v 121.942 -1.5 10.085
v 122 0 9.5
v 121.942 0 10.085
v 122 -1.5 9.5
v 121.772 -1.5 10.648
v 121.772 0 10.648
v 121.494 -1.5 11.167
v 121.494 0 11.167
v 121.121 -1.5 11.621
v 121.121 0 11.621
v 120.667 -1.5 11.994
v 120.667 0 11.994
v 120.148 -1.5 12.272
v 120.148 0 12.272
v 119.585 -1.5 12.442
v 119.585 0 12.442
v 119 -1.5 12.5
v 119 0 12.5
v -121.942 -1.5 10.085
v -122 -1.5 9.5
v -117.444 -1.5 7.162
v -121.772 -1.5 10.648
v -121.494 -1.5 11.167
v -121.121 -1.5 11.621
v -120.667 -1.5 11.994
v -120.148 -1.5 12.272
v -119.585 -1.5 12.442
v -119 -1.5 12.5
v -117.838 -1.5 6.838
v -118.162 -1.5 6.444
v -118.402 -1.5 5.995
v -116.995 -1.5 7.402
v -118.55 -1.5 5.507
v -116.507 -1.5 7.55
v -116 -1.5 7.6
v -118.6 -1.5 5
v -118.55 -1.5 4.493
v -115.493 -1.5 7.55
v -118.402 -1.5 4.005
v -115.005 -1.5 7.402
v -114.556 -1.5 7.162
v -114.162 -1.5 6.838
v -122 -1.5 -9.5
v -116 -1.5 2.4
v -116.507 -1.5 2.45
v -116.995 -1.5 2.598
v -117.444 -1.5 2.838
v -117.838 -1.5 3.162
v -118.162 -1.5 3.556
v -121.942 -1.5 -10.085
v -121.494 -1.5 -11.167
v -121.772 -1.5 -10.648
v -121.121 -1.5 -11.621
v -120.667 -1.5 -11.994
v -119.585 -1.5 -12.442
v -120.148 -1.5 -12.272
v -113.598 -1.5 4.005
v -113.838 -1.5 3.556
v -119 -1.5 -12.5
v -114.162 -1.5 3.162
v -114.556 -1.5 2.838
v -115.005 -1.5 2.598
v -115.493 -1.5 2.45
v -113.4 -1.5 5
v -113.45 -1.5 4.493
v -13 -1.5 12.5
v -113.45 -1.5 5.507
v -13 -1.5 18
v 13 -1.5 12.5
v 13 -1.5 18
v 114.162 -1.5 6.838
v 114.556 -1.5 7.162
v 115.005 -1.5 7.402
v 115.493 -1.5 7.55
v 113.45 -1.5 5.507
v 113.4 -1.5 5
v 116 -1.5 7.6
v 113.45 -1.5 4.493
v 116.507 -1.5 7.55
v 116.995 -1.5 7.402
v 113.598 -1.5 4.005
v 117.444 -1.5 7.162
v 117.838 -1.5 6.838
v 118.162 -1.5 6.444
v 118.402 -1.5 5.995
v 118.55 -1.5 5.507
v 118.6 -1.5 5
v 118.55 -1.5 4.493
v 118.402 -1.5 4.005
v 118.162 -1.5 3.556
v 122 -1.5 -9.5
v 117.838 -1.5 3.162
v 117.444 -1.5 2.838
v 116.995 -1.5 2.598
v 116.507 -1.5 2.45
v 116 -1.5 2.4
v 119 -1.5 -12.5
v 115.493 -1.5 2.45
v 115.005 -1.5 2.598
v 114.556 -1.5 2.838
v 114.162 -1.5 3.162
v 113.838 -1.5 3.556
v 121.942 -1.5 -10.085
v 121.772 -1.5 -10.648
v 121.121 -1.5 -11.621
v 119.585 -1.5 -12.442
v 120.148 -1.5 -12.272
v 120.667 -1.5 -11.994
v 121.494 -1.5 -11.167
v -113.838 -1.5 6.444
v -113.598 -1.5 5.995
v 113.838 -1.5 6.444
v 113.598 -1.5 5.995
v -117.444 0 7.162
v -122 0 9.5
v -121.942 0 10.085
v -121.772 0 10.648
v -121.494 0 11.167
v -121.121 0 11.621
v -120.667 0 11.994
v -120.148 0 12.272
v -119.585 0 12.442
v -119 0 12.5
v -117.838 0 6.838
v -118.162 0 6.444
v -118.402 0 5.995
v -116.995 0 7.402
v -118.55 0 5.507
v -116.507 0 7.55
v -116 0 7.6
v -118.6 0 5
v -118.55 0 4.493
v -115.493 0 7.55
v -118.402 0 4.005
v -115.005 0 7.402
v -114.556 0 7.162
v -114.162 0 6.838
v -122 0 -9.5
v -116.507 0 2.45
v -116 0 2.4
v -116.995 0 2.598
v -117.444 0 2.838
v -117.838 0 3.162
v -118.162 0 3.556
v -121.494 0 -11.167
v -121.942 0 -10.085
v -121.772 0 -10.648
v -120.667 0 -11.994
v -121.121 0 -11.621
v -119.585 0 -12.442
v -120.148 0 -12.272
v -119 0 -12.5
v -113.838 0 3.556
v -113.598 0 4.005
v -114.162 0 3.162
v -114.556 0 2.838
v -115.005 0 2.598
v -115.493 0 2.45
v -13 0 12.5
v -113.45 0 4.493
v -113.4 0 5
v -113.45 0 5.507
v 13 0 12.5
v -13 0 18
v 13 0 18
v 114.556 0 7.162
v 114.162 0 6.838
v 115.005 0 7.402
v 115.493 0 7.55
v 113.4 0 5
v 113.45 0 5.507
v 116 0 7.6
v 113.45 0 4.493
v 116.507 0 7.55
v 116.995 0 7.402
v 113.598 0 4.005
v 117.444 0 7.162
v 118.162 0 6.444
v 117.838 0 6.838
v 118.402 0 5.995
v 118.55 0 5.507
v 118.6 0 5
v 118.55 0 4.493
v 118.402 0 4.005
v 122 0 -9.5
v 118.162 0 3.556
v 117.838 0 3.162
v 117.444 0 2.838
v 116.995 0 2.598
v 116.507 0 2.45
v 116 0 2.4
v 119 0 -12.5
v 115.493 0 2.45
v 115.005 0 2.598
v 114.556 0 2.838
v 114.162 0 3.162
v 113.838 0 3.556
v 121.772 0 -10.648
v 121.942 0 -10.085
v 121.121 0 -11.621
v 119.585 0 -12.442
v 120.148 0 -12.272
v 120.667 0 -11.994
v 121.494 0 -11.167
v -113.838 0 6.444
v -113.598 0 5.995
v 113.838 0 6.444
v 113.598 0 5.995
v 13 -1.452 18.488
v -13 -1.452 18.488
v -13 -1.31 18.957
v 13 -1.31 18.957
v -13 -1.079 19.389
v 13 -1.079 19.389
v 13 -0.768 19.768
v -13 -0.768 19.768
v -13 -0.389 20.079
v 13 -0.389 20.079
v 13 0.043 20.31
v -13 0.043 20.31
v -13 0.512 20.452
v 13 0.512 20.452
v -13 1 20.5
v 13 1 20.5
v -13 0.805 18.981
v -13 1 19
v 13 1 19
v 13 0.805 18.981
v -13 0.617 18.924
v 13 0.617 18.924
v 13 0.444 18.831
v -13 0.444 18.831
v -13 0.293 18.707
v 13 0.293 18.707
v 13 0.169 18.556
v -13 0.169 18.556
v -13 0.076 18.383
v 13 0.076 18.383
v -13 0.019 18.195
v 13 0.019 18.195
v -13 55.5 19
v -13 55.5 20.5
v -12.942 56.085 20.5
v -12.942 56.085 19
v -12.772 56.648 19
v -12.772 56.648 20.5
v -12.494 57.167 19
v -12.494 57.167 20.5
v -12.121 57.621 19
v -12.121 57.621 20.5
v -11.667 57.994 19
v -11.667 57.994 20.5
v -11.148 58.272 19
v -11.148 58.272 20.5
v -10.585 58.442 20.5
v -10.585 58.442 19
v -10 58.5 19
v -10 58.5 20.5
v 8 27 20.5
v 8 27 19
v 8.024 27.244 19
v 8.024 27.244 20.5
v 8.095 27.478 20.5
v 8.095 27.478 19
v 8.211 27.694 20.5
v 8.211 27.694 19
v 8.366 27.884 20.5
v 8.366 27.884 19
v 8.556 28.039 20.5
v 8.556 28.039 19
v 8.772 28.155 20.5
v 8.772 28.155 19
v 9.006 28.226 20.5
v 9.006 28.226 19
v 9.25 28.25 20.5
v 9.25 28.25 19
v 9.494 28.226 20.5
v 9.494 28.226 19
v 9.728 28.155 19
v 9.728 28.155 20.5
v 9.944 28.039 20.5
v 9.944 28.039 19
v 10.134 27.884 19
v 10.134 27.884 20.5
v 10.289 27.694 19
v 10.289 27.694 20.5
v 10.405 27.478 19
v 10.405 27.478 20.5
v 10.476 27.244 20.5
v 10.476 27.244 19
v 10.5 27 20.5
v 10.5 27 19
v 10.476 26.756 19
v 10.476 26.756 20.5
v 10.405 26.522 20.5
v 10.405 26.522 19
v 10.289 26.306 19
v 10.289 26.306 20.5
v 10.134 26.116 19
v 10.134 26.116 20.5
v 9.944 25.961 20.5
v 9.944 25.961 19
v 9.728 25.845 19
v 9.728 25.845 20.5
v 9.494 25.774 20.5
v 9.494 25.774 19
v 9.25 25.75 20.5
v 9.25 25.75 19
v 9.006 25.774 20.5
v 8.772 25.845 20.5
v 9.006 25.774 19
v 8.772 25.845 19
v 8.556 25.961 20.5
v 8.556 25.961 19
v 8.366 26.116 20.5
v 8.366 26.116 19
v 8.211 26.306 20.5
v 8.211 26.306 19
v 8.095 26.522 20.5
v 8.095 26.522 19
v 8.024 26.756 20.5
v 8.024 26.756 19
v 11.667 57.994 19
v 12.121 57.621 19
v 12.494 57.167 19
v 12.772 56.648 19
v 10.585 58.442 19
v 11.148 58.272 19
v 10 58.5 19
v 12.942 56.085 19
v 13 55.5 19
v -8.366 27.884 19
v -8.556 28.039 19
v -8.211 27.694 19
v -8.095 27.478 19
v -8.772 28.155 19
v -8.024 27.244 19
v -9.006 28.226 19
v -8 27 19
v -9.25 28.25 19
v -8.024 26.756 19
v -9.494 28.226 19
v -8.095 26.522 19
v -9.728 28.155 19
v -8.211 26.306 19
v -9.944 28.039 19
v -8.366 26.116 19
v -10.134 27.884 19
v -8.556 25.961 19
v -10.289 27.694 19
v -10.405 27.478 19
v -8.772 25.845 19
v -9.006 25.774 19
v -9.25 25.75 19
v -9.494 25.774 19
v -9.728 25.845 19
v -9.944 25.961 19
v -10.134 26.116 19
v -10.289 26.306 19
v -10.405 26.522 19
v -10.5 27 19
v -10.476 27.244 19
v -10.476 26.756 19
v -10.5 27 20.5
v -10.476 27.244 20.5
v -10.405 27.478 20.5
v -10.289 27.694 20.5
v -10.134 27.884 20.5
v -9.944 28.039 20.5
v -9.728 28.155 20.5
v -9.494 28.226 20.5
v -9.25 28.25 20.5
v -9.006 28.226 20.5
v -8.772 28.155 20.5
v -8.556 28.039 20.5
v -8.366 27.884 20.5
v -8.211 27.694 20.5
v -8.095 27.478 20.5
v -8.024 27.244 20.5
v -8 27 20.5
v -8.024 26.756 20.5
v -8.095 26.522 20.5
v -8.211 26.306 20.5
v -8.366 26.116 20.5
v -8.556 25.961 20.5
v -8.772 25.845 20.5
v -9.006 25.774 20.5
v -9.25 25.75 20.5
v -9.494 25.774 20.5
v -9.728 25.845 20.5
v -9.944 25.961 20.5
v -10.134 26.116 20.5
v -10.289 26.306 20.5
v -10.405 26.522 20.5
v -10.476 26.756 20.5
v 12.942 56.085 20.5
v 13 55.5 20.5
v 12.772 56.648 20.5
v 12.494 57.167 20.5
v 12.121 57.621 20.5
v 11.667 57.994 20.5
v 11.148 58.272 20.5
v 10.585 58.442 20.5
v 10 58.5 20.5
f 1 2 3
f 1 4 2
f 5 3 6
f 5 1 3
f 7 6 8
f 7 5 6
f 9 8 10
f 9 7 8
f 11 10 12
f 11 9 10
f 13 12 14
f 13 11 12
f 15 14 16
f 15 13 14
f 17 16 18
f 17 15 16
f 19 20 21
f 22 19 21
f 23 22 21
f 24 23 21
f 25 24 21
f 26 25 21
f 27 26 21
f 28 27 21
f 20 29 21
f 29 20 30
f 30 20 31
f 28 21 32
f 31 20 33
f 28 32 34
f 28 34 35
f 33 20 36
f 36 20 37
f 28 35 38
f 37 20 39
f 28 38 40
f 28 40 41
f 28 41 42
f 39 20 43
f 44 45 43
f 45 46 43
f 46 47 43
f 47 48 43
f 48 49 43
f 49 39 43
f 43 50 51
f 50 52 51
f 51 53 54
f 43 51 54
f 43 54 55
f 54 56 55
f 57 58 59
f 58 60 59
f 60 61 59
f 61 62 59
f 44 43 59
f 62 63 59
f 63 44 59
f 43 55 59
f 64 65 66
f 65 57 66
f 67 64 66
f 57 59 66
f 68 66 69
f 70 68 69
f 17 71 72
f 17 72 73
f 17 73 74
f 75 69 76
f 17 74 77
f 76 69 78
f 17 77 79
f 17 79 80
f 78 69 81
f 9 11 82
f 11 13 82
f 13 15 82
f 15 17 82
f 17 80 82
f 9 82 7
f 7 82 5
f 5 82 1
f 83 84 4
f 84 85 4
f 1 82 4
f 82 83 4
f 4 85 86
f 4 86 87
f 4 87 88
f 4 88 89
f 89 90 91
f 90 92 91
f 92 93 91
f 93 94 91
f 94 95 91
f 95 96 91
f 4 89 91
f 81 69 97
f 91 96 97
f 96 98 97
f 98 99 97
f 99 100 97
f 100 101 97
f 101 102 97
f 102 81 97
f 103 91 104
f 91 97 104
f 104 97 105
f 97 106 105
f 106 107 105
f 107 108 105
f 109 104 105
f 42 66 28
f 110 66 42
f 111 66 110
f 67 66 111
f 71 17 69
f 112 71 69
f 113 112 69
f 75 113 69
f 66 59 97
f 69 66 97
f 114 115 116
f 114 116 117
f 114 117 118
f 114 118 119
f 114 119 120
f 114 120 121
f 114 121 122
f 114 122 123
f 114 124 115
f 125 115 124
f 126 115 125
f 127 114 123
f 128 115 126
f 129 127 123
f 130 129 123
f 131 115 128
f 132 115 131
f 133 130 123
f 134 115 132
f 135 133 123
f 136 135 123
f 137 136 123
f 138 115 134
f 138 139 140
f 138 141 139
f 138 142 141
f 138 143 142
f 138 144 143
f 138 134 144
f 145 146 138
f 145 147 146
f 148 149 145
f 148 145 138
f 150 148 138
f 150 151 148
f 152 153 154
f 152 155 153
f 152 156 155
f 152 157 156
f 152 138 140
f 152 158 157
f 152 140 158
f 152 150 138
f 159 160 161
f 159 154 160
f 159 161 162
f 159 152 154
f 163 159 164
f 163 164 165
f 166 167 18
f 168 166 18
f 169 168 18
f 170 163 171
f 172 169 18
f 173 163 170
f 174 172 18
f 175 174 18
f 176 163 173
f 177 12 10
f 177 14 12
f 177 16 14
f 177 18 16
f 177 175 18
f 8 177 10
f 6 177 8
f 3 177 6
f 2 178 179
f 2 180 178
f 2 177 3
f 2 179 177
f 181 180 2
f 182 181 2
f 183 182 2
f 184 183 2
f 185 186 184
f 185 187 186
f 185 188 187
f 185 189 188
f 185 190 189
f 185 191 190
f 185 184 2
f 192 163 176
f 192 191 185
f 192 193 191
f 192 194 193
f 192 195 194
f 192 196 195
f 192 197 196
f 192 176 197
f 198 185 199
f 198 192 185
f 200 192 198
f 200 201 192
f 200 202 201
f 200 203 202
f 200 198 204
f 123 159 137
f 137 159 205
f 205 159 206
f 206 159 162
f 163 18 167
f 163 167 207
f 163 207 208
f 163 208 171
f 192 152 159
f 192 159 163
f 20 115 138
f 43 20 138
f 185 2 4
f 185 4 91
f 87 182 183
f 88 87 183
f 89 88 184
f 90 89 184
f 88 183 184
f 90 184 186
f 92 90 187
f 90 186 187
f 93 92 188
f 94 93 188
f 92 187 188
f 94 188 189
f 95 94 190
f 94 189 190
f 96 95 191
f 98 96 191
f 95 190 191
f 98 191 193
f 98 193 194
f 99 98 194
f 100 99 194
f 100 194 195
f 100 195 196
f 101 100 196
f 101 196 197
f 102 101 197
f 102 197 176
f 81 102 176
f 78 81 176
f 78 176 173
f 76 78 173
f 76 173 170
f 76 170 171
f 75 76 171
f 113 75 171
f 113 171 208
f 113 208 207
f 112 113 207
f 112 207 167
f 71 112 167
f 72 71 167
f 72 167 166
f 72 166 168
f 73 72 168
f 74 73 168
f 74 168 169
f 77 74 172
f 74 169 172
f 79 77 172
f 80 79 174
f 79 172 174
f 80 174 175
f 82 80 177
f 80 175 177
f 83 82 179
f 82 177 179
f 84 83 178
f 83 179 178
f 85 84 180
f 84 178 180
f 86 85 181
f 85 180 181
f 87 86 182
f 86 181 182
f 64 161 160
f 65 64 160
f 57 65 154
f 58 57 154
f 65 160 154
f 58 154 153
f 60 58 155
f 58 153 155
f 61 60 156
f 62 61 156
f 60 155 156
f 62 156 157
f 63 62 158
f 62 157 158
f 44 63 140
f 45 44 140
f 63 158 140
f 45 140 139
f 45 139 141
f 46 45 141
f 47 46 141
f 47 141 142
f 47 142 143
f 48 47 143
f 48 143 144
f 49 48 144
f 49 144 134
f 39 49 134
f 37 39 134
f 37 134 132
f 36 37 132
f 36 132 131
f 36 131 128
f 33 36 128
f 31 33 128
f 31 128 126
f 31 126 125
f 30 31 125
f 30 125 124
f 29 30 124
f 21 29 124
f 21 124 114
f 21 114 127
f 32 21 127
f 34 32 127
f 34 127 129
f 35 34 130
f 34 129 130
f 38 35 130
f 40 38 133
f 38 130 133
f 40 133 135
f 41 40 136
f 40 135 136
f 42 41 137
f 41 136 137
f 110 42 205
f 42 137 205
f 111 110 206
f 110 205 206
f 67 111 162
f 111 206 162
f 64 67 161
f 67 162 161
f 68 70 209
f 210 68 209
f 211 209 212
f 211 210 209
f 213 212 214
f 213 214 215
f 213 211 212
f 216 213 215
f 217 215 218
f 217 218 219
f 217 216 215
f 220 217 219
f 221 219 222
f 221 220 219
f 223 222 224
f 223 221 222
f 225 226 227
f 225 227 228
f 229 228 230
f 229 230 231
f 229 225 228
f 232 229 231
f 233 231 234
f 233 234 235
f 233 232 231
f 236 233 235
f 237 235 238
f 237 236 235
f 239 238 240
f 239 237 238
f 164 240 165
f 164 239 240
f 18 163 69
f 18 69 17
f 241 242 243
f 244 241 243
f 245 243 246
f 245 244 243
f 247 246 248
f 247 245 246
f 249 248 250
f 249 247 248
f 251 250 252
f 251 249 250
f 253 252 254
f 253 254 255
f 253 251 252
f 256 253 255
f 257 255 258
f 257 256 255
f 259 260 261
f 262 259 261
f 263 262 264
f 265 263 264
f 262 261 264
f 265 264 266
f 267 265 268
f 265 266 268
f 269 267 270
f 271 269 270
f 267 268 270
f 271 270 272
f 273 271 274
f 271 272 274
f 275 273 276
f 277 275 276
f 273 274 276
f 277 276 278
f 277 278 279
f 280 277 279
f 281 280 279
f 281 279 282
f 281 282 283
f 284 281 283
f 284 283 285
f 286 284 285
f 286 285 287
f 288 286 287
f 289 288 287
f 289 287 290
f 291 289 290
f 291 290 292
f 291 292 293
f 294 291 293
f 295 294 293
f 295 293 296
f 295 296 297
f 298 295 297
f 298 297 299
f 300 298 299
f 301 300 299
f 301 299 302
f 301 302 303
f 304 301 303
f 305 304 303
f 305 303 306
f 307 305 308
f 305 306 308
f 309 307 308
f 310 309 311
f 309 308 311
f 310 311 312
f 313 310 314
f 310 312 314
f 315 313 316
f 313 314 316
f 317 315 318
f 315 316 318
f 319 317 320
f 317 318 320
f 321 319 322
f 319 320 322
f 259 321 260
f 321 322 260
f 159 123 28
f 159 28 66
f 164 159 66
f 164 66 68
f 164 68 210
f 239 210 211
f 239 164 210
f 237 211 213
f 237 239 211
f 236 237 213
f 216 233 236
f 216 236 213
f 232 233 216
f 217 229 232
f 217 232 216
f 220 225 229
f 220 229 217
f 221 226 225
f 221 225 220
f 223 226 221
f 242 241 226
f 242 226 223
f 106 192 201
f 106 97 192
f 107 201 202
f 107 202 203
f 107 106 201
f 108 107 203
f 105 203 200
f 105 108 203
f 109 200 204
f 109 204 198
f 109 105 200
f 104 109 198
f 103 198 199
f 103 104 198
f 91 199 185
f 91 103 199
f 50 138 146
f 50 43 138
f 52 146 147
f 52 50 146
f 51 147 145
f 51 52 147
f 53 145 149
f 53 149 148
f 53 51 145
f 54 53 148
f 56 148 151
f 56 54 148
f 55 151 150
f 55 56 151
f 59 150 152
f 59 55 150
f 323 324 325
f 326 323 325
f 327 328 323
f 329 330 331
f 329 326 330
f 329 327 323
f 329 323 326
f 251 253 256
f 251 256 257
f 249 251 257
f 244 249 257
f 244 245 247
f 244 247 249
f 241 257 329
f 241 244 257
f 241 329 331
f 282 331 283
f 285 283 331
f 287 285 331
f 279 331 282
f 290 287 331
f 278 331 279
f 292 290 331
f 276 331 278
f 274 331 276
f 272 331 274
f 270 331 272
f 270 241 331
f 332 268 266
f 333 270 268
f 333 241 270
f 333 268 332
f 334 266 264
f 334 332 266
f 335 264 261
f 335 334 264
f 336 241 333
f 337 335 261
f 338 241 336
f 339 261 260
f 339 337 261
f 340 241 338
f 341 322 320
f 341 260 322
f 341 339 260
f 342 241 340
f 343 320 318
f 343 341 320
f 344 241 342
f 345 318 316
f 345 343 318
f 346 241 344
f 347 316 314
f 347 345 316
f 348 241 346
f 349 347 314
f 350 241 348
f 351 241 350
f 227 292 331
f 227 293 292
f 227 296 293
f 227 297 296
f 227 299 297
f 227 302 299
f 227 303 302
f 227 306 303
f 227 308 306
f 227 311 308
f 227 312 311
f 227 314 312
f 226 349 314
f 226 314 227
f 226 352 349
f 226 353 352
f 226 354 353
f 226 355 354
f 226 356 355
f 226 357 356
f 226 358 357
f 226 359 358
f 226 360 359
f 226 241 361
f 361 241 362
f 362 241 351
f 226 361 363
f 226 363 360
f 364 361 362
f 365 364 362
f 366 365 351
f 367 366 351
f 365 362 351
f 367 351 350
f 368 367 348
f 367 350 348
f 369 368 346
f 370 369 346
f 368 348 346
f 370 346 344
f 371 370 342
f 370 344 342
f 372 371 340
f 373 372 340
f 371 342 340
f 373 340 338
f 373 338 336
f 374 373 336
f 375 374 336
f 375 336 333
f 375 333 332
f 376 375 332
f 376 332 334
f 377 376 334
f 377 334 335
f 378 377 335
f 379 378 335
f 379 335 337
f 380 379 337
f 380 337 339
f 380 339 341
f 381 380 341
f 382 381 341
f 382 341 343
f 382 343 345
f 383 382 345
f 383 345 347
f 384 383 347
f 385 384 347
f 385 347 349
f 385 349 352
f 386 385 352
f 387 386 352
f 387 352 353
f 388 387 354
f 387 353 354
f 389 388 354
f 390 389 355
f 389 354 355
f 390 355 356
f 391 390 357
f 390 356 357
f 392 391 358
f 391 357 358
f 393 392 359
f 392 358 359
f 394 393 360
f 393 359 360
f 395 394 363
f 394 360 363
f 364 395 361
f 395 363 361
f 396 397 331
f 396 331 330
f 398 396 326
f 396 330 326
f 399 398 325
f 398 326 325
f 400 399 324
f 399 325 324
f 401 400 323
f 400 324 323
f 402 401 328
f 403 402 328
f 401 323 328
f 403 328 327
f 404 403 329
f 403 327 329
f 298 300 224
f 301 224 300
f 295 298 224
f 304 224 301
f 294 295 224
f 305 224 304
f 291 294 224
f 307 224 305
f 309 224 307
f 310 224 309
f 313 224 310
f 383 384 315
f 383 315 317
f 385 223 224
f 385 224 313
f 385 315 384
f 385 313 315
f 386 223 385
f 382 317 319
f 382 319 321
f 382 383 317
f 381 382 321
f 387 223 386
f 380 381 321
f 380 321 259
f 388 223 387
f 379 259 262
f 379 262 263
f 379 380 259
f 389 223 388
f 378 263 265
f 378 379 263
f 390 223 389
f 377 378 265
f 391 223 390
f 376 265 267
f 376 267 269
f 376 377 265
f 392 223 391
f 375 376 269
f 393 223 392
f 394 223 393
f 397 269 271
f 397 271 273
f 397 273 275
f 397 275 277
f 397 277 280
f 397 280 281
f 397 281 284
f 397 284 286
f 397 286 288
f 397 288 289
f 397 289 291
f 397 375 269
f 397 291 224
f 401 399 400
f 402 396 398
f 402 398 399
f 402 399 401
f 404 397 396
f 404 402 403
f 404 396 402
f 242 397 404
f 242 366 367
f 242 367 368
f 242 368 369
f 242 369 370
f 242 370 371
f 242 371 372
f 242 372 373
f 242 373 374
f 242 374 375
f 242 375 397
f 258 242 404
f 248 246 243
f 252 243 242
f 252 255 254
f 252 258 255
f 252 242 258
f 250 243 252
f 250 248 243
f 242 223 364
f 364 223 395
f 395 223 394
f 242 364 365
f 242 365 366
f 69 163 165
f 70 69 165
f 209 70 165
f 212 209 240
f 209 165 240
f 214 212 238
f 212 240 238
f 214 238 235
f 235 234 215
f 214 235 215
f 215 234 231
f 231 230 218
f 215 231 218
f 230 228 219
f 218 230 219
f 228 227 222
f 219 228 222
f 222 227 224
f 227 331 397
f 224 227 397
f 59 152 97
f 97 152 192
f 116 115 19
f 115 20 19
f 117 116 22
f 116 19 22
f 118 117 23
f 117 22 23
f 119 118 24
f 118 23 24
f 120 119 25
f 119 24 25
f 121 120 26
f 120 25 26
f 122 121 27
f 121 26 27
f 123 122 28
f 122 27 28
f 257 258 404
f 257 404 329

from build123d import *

# Parameters (mm, degrees)
SKETCH_2_W              = 244
SKETCH_2_H              = 25
SM_BASE_FLANGE_1_DEPTH  = 1.5
SM_EDGE_FLANGE_1_DEPTH  = 26
HOLE_WIZARD_5_2_5_2_1_D = 5.2
HOLE_WIZARD_M3_1_D      = 2.5
FILLET_1_R              = 3


# Sheet-metal steps are written as plain solids
with BuildPart() as part:
    # Sketch 2 → 基体-法兰1 (new body)
    with BuildSketch(Plane(origin=(0, 0, 0), x_dir=(1, 0, 0), z_dir=(0, 1, 0))):
        Rectangle(SKETCH_2_W, SKETCH_2_H)
    extrude(amount=-SM_BASE_FLANGE_1_DEPTH)

    # 边线-法兰1 section (across the edge) → 边线-法兰1 (add)
    with BuildSketch(Plane(origin=(-13, 0, 20.5), x_dir=(0, 0, -1), z_dir=(1, 0, 0))):
        with BuildLine():
            Line((0, 1), (0, 58.5))
            Line((0, 58.5), (1.5, 58.5))
            Line((1.5, 58.5), (1.5, 1))
            ThreePointArc((1.5, 1), (1.792893219, 0.292893219), (2.5, 0))
            Line((2.5, 0), (8, 0))
            Line((8, 0), (8, -1.5))
            Line((8, -1.5), (2.5, -1.5))
            ThreePointArc((2.5, -1.5), (0.732233047, -0.767766953), (0, 1))
        make_face()
    extrude(amount=SM_EDGE_FLANGE_1_DEPTH)

    # Ø5.2 (5.2) 直径孔1 (through all)
    with Locations(Plane(origin=(0, -1.5, 0), x_dir=(-1, 0, 0), z_dir=(0, -1, 0))):
        with Locations((116, -5), (-116, -5)):
            Hole(HOLE_WIZARD_5_2_5_2_1_D / 2)

    # M3 螺纹孔1 (through all)
    with Locations(Plane.XY.offset(20.5)):
        with Locations((-9.25, 27), (9.25, 27)):
            Hole(HOLE_WIZARD_M3_1_D / 2)

    # 圆角1
    fillet_1_edges = [part.edges().sort_by_distance(p)[0] for p in [
        (122, -0.75, -12.5),
        (122, -0.75, 12.5),
        (13, 58.5, 19.75),
        (-13, 58.5, 19.75),
        (-122, -0.75, 12.5),
        (-122, -0.75, -12.5),
    ]]
    fillet(fillet_1_edges, radius=FILLET_1_R)


solid = part.part
